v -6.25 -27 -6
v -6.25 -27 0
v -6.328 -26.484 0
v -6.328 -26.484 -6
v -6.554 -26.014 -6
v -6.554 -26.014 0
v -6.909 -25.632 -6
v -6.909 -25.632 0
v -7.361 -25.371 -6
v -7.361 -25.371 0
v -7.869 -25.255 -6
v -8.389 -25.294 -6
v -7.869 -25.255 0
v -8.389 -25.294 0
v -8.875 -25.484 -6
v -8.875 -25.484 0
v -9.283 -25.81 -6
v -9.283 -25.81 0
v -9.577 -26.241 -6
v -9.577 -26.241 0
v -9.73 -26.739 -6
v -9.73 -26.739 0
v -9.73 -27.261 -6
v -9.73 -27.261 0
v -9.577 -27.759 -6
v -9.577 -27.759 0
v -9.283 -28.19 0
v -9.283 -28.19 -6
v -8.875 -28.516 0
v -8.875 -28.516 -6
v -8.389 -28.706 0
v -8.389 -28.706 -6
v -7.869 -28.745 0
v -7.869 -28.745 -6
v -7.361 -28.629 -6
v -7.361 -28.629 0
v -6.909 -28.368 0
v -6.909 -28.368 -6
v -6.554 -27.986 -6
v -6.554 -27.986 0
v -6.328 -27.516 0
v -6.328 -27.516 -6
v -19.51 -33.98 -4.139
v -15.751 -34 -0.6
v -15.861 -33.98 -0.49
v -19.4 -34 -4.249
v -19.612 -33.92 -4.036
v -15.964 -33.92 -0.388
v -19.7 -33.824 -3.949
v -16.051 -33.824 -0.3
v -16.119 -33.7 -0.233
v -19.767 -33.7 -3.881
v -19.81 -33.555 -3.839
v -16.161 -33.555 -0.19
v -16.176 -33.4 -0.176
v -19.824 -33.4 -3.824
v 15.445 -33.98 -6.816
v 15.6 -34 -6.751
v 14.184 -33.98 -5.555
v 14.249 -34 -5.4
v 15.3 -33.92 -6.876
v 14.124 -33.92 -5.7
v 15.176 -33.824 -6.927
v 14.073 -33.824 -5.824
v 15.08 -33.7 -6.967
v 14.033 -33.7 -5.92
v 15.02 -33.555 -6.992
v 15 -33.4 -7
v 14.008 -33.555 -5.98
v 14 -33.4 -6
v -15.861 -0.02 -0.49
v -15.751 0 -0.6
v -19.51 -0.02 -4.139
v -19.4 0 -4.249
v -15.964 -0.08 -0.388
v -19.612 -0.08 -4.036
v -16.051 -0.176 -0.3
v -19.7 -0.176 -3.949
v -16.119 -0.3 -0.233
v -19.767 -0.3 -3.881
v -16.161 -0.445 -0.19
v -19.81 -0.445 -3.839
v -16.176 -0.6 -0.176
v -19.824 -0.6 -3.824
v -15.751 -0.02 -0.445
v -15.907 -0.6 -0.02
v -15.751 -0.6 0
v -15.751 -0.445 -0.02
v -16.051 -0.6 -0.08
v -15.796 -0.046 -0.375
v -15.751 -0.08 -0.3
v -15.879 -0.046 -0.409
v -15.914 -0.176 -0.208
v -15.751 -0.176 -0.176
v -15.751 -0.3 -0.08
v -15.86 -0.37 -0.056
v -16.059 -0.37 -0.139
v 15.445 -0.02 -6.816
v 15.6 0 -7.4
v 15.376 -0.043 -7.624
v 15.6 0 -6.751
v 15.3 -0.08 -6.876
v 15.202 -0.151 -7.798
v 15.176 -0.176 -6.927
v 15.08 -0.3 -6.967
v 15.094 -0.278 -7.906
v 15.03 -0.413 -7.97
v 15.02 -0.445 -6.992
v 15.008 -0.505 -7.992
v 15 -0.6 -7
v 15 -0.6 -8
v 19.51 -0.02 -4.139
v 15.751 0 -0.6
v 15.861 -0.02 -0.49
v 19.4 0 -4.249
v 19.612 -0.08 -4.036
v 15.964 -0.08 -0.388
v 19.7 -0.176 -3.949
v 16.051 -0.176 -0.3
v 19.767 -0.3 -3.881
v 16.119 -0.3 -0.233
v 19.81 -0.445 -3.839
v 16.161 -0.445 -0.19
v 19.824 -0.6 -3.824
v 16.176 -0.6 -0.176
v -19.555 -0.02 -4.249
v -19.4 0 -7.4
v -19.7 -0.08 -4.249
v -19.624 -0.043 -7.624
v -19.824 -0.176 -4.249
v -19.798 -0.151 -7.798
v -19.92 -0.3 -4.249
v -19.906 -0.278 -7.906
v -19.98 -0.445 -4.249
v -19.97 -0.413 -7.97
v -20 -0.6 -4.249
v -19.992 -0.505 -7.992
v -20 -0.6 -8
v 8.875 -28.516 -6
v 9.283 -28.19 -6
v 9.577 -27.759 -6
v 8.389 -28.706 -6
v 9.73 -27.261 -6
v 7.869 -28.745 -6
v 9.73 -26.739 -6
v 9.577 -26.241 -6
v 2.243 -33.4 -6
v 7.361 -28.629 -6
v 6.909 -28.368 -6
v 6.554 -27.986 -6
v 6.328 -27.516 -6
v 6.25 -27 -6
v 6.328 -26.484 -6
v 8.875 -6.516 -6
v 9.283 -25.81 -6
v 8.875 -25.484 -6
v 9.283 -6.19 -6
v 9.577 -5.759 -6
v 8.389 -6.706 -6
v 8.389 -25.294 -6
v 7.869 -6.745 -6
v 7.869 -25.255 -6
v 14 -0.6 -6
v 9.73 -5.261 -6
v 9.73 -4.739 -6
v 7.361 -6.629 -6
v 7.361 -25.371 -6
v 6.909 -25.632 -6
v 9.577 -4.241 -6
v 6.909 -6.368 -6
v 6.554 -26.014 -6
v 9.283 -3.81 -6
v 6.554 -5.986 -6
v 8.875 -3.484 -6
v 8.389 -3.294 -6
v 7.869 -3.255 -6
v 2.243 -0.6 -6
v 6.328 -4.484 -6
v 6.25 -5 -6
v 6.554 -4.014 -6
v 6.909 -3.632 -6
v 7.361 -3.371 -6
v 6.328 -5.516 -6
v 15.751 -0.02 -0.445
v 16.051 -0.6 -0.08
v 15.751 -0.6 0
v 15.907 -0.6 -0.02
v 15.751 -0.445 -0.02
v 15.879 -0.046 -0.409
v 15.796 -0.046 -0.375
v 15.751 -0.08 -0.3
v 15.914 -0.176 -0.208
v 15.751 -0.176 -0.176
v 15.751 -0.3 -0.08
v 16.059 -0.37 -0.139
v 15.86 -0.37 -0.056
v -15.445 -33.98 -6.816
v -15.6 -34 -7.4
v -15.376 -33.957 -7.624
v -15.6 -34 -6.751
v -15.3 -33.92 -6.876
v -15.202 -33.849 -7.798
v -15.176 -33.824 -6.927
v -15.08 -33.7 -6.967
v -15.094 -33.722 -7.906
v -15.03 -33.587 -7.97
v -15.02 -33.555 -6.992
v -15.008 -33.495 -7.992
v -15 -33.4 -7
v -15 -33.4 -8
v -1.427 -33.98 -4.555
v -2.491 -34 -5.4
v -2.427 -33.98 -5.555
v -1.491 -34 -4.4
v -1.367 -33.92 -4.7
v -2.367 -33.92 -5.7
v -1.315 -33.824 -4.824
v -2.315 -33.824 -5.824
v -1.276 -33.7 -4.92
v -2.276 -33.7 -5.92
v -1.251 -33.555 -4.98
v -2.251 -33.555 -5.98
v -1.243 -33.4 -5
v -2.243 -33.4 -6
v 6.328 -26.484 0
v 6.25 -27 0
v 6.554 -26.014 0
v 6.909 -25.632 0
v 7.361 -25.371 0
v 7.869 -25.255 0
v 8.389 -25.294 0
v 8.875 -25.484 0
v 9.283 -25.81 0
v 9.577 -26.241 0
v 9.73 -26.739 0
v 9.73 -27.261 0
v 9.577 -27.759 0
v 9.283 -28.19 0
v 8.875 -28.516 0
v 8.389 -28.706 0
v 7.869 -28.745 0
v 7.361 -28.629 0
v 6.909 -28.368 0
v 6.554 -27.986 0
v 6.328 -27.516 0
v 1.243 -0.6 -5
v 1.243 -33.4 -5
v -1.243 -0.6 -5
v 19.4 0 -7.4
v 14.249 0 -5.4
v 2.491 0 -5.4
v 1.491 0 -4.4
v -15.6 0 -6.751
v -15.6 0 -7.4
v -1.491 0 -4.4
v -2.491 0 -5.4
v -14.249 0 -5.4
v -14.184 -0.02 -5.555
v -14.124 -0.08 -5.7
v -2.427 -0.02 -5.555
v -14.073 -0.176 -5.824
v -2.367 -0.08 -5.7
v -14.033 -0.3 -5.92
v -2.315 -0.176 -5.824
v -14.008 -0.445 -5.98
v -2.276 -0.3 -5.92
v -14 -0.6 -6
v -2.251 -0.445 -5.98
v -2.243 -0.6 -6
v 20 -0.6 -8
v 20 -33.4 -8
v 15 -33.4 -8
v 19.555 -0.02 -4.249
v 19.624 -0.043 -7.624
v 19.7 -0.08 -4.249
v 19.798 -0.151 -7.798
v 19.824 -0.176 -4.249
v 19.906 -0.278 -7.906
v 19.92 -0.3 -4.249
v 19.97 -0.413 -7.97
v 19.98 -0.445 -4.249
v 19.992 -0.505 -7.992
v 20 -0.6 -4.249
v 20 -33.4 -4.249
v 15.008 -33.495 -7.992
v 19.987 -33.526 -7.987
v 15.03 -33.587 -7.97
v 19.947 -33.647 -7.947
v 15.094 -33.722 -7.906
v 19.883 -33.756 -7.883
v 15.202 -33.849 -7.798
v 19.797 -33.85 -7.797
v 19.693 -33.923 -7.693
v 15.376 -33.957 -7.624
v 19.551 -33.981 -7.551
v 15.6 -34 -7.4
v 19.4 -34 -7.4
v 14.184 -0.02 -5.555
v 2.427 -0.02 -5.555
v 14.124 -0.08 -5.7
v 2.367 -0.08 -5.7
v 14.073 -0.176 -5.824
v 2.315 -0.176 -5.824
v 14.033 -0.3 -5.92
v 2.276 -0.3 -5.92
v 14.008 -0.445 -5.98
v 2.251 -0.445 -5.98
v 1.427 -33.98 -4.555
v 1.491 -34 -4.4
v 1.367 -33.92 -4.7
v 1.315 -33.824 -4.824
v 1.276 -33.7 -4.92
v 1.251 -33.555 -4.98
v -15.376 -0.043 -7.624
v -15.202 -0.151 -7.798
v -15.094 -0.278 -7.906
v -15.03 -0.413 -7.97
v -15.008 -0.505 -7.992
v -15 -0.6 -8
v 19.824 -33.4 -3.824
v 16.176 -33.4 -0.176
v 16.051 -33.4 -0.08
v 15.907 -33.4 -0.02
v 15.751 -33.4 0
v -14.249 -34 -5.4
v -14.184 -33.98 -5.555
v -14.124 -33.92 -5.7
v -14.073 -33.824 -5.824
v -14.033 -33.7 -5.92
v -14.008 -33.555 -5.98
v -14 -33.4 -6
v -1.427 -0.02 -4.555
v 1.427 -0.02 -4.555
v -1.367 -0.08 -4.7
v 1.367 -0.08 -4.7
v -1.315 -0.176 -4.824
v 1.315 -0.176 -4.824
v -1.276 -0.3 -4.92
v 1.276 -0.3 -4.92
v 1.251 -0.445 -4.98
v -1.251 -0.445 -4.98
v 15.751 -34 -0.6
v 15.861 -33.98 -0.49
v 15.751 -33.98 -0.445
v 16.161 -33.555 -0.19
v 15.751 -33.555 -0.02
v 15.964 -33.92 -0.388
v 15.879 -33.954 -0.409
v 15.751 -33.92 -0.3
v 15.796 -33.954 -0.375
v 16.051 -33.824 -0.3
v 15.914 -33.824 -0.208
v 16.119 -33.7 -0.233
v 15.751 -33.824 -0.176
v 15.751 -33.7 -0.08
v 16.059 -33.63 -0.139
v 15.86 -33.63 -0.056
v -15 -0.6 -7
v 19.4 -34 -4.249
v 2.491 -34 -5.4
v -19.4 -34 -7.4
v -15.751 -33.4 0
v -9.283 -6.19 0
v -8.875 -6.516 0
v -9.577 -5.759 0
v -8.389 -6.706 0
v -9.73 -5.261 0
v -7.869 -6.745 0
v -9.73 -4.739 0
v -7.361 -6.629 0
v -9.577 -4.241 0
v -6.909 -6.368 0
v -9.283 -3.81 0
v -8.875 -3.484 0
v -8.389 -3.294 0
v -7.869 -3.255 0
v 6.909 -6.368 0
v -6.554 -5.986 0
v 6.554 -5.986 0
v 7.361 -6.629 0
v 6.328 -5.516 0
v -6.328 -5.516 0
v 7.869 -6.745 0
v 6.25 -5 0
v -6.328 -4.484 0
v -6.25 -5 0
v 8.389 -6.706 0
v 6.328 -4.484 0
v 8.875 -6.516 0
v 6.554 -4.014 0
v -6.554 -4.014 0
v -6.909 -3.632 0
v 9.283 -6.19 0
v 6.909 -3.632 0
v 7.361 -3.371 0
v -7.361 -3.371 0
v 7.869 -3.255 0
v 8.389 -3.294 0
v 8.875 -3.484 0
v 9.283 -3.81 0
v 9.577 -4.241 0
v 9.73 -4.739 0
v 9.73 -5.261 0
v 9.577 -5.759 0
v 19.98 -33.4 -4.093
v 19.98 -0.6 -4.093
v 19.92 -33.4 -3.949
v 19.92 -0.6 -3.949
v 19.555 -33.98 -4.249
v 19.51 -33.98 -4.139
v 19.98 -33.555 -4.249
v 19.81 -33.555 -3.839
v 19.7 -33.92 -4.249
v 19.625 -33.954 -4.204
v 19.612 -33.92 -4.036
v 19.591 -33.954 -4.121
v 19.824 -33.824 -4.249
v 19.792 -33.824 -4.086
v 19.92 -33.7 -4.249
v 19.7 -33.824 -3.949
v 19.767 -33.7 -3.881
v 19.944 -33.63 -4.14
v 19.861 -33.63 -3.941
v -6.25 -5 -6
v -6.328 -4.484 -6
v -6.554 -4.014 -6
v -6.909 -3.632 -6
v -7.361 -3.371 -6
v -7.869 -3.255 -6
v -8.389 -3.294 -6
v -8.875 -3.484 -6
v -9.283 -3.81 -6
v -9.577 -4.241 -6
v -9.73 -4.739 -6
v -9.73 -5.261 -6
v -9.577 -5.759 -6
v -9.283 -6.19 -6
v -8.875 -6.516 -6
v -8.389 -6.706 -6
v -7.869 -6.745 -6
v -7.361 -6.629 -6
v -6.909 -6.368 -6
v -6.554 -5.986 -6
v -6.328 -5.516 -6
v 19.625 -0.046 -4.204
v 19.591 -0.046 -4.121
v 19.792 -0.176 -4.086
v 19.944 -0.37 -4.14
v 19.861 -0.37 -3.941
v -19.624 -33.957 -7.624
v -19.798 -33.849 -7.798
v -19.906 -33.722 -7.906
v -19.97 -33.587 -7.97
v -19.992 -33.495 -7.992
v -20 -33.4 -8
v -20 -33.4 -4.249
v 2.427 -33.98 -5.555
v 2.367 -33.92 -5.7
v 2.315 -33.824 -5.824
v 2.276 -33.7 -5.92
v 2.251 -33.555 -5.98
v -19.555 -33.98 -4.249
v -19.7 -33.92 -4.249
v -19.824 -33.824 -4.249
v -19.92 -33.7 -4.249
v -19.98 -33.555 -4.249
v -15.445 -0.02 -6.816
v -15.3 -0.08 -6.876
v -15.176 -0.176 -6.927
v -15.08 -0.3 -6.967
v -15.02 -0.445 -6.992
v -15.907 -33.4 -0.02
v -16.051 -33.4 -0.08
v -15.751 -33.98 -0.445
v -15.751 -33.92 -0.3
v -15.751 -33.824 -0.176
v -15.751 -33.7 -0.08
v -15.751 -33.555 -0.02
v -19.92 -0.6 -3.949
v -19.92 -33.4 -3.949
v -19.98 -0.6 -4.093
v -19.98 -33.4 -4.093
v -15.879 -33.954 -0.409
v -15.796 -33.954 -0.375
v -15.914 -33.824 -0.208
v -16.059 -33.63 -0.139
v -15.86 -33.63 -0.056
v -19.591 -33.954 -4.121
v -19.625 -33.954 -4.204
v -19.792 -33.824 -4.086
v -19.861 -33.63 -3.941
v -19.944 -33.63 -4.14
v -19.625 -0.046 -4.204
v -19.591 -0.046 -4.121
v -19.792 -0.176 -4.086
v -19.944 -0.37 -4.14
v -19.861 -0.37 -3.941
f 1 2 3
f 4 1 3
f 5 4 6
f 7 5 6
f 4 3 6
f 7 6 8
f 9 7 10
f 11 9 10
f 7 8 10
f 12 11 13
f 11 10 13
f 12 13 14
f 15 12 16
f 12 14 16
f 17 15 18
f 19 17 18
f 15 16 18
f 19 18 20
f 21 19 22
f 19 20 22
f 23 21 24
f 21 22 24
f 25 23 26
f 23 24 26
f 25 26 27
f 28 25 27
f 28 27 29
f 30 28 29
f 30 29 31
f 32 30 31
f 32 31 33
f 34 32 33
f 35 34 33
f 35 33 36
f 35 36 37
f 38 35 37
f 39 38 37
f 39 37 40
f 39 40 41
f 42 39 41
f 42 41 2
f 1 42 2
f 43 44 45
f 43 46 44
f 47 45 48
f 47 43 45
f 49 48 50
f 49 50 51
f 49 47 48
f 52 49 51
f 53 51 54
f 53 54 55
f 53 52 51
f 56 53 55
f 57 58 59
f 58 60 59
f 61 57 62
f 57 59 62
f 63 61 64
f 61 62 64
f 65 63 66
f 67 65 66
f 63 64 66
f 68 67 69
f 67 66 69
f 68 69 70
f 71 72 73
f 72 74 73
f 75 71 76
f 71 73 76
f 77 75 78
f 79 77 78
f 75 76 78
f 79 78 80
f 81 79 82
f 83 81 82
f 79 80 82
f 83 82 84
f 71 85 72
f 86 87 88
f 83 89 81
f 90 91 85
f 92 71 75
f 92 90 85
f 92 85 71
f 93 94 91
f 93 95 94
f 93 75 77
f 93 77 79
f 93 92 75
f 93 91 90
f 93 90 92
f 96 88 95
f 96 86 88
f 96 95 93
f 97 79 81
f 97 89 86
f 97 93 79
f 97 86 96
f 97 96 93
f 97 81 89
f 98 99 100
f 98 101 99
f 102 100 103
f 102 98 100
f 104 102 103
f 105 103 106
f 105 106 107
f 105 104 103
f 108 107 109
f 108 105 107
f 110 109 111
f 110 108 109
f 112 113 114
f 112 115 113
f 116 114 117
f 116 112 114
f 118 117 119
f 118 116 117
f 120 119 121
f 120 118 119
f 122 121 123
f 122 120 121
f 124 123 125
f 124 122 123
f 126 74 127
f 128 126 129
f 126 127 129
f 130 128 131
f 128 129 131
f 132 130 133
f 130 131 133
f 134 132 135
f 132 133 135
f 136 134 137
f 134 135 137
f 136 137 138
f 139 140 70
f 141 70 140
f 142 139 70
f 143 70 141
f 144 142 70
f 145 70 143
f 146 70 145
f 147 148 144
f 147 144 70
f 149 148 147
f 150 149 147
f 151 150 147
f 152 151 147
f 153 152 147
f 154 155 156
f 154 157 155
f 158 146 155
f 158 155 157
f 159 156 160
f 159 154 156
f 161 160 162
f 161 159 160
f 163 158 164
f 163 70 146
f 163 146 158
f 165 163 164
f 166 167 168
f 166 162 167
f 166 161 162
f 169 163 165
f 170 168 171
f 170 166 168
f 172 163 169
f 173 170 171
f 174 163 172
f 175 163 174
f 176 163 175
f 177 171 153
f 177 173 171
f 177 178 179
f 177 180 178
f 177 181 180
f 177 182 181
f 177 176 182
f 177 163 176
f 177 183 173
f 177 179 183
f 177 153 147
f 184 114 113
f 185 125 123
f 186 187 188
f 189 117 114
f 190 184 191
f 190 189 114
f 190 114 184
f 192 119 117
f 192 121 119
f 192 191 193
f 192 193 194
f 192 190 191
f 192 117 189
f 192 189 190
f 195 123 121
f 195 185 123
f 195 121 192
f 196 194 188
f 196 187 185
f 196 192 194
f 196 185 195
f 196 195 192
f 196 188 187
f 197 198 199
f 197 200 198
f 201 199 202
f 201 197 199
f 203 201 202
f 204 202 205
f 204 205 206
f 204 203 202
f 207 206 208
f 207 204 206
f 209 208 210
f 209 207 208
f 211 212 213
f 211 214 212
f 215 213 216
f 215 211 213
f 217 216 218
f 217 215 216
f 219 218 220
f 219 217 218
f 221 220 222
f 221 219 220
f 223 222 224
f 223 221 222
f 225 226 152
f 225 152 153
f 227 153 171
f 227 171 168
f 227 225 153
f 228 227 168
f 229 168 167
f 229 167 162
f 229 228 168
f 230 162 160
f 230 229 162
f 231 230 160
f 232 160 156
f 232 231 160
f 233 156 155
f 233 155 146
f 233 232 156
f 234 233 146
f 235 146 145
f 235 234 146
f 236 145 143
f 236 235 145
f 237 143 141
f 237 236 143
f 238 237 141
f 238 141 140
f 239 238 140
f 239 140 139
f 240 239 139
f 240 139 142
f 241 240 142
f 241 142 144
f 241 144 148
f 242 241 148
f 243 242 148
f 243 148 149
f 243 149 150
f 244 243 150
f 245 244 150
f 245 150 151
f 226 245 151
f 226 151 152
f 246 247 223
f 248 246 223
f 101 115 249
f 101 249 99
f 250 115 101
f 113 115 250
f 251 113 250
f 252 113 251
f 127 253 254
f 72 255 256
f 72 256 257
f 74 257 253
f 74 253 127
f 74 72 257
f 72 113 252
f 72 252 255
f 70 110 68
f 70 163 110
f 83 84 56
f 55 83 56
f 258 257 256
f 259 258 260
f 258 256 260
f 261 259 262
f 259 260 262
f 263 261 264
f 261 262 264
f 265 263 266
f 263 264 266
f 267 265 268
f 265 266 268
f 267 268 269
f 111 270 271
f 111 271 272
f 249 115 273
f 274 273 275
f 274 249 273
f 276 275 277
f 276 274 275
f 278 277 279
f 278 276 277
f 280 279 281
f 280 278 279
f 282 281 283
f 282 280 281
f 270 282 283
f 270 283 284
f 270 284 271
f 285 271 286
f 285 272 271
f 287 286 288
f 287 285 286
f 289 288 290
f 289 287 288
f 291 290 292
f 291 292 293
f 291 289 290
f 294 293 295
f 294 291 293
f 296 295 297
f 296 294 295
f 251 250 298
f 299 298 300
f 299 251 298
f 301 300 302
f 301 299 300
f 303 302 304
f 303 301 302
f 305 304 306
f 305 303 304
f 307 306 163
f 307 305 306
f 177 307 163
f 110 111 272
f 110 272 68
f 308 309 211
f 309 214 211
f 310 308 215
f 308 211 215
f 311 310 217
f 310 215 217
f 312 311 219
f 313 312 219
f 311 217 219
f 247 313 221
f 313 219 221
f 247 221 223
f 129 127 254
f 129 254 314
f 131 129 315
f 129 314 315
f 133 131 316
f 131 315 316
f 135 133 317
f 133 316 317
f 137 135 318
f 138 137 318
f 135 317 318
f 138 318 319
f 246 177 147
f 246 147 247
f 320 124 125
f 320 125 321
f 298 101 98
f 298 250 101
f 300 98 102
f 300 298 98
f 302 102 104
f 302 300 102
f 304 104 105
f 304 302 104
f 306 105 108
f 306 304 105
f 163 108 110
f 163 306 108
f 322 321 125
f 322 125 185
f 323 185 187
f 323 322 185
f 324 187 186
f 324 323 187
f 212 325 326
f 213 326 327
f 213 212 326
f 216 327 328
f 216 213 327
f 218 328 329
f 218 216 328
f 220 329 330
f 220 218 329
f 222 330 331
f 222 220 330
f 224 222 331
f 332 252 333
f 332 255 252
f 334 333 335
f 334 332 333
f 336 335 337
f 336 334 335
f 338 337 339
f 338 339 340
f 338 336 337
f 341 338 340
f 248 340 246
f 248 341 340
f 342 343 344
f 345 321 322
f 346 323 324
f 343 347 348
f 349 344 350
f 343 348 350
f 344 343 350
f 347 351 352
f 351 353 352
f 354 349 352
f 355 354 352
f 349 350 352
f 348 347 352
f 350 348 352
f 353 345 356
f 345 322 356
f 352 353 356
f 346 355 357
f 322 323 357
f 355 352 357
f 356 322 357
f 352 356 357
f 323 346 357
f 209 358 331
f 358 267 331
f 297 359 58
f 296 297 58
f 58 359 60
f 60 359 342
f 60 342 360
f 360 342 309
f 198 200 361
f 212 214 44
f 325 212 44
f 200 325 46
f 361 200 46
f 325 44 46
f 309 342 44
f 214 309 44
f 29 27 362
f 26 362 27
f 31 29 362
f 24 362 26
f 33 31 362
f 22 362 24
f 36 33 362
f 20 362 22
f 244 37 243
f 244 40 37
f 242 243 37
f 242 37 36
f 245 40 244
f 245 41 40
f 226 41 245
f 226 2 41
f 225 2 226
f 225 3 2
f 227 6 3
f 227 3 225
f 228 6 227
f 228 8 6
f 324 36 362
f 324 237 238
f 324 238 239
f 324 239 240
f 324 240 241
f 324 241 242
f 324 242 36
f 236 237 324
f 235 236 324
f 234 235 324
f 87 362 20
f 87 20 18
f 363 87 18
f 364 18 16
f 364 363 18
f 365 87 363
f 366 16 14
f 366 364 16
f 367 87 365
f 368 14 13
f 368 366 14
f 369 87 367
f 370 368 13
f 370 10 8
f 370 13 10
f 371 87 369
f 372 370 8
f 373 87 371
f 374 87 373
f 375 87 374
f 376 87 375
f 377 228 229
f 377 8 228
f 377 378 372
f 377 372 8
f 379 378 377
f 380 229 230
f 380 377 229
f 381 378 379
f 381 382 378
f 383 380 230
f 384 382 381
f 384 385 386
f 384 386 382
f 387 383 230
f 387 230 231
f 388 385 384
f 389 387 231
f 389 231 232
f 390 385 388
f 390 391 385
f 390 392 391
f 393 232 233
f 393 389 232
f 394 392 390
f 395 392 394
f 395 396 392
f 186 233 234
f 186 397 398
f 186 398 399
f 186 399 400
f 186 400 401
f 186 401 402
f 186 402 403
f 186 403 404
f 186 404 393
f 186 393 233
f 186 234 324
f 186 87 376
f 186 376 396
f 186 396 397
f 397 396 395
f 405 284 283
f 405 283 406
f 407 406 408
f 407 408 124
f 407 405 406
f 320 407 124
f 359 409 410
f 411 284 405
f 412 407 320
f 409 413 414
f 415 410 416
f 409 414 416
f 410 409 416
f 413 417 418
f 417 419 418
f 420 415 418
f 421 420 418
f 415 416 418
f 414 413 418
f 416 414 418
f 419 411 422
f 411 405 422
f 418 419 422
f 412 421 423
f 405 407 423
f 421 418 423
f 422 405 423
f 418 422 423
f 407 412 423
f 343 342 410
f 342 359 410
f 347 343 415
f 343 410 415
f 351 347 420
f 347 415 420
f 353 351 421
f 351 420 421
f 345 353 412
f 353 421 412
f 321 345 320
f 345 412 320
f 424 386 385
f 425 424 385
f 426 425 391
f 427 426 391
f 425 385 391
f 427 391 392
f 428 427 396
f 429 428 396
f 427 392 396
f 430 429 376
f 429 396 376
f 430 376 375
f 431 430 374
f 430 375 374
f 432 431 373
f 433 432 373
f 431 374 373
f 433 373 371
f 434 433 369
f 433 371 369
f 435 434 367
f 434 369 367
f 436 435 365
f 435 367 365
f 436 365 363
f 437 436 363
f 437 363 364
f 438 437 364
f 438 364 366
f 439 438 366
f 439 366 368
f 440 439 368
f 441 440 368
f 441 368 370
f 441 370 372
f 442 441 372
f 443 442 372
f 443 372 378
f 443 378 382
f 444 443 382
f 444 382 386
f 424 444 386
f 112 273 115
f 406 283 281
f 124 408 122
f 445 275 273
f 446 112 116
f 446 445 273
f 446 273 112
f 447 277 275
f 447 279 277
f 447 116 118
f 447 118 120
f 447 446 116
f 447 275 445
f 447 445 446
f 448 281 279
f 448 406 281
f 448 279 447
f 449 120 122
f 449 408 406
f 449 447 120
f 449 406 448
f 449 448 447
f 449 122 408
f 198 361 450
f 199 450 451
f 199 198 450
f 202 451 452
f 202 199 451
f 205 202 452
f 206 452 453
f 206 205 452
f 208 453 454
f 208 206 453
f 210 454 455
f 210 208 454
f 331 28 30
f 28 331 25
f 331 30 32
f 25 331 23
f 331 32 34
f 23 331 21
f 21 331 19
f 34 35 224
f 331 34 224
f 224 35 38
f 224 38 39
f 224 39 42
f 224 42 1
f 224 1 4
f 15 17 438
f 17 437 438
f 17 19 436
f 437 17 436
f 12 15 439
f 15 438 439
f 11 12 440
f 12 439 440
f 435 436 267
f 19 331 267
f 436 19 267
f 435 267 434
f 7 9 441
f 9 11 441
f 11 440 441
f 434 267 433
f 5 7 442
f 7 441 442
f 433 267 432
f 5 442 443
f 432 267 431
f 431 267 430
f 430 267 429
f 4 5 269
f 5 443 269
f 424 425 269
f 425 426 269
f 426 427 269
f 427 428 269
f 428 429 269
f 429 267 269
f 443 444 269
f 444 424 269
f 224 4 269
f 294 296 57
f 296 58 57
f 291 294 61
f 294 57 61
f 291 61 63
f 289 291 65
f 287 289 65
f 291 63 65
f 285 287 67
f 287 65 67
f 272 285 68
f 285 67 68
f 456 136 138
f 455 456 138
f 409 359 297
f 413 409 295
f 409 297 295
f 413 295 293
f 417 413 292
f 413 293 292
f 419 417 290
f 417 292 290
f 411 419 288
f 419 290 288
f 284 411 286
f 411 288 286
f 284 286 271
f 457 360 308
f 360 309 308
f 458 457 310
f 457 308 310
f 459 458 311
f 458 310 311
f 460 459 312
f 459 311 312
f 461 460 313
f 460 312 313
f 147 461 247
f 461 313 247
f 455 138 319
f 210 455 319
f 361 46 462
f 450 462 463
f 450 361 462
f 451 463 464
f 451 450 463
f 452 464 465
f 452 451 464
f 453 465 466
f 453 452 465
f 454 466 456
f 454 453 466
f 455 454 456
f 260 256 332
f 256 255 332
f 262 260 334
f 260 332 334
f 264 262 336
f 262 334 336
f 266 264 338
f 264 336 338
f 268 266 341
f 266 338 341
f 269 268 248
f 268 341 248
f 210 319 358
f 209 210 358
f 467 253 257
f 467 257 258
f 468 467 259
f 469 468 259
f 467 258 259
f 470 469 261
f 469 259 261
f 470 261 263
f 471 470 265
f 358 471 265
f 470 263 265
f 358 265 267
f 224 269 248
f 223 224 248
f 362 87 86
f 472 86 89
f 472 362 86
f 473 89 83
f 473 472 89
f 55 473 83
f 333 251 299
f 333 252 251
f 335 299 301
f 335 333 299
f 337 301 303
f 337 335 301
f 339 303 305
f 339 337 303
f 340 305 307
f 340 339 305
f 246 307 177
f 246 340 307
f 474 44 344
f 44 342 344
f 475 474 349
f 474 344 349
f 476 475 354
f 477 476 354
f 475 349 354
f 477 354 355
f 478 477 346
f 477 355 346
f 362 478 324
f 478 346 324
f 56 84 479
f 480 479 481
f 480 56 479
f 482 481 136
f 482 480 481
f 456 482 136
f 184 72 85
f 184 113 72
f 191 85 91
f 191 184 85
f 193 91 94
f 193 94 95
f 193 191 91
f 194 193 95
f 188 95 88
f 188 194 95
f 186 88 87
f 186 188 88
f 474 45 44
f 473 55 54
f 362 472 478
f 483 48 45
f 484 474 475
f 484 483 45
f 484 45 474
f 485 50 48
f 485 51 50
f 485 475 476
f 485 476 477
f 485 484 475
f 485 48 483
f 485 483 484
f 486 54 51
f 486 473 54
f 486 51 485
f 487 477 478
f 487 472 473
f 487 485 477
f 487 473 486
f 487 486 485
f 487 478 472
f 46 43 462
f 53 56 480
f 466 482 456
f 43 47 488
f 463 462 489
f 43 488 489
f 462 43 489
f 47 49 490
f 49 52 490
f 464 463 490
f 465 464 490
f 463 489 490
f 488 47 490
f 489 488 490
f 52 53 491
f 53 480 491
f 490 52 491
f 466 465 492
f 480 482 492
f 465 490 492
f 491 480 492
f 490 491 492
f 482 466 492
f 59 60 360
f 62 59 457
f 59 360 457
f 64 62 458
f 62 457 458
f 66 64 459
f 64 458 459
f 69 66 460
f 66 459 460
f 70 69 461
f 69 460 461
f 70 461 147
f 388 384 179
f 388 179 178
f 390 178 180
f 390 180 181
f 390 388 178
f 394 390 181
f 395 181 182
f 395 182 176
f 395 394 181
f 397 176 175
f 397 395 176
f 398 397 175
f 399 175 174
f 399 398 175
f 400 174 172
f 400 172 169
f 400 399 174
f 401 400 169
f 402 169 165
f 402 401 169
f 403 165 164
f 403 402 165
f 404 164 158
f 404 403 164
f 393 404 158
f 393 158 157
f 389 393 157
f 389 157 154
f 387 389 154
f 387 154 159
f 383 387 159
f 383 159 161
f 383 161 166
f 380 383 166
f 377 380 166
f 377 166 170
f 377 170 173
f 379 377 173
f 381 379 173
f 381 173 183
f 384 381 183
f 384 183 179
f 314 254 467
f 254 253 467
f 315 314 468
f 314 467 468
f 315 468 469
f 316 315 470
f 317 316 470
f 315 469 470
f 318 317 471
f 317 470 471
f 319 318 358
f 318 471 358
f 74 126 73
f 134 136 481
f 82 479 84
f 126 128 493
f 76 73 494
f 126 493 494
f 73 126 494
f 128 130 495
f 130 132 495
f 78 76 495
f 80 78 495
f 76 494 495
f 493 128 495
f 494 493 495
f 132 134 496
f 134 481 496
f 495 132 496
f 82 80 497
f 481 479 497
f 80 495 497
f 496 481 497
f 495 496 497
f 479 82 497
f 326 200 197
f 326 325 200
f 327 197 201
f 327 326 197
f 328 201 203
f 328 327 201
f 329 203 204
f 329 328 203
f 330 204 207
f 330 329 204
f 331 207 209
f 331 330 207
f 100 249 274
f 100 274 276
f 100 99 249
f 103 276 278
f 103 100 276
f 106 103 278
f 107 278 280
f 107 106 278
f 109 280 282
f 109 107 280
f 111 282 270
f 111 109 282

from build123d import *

# Parameters (mm, degrees)
F1_DEPTH = 34
F2_R     = 1.75
F3_DEPTH = 8.001
F4_SIZE  = 4
F5_SIZE  = 1
F8_R     = 0.6


with BuildPart() as f1:
    # F0 (on Front) → F1 (new body)
    with BuildSketch(Plane.XZ):
        Polygon((0, -5), (0, 0), (-20, 0), (-20, -8), (-15, -8), (-15, -6), (-2.2426406871, -6), (-1.2426406871, -5), align=None)
    extrude(amount=F1_DEPTH)

    # F2 (on face) → F3 (cut, through all)
    with BuildSketch(Plane.XY):
        with Locations((-8, -5)):
            Circle(F2_R)
        with Locations((-8, -27)):
            Circle(F2_R)
    extrude(amount=-F3_DEPTH, mode=Mode.SUBTRACT)

    # F4
    f4_edges = [f1.edges().sort_by_distance(p)[0] for p in [
        (-20, -17, 0),
    ]]
    chamfer(f4_edges, length=F4_SIZE)

    # F5
    f5_edges = [f1.edges().sort_by_distance(p)[0] for p in [
        (-15, -17, -6),
    ]]
    chamfer(f5_edges, length=F5_SIZE)

    # F6: F1 across face


with BuildPart() as f1_1:
    add(f1.part)
    add(f1.part.mirror(Plane(origin=(0, -17, -2.5), x_dir=(0, 1, 0), z_dir=(1, 0, 0))))

    # F8
    f8_edges = [f1_1.edges().sort_by_distance(p)[0] for p in [
        (20, -17, -4),
        (16, -17, 0),
        (-18, 0, -2),
        (-16, -17, 0),
        (-20, -17, -4),
        (-18, -34, -2),
        (-15, 0, -7.5),
        (-14.5, 0, -6.5),
        (-8.12132, 0, -6),
        (-1.742641, 0, -5.5),
        (0, 0, -5),
        (1.742641, 0, -5.5),
        (8.12132, 0, -6),
        (14.5, 0, -6.5),
        (15, 0, -7.5),
        (17.5, 0, -8),
        (20, 0, -6),
        (18, 0, -2),
        (0, 0, 0),
        (-20, 0, -6),
        (-17.5, 0, -8),
        (-17.5, -34, -8),
        (-15, -34, -7.5),
        (-14.5, -34, -6.5),
        (-8.12132, -34, -6),
        (-1.742641, -34, -5.5),
        (0, -34, -5),
        (1.742641, -34, -5.5),
        (8.12132, -34, -6),
        (14.5, -34, -6.5),
        (15, -34, -7.5),
        (17.5, -34, -8),
        (20, -34, -6),
        (18, -34, -2),
        (0, -34, 0),
        (-20, -34, -6),
    ]]
    fillet(f8_edges, radius=F8_R)


solid = f1_1.part
